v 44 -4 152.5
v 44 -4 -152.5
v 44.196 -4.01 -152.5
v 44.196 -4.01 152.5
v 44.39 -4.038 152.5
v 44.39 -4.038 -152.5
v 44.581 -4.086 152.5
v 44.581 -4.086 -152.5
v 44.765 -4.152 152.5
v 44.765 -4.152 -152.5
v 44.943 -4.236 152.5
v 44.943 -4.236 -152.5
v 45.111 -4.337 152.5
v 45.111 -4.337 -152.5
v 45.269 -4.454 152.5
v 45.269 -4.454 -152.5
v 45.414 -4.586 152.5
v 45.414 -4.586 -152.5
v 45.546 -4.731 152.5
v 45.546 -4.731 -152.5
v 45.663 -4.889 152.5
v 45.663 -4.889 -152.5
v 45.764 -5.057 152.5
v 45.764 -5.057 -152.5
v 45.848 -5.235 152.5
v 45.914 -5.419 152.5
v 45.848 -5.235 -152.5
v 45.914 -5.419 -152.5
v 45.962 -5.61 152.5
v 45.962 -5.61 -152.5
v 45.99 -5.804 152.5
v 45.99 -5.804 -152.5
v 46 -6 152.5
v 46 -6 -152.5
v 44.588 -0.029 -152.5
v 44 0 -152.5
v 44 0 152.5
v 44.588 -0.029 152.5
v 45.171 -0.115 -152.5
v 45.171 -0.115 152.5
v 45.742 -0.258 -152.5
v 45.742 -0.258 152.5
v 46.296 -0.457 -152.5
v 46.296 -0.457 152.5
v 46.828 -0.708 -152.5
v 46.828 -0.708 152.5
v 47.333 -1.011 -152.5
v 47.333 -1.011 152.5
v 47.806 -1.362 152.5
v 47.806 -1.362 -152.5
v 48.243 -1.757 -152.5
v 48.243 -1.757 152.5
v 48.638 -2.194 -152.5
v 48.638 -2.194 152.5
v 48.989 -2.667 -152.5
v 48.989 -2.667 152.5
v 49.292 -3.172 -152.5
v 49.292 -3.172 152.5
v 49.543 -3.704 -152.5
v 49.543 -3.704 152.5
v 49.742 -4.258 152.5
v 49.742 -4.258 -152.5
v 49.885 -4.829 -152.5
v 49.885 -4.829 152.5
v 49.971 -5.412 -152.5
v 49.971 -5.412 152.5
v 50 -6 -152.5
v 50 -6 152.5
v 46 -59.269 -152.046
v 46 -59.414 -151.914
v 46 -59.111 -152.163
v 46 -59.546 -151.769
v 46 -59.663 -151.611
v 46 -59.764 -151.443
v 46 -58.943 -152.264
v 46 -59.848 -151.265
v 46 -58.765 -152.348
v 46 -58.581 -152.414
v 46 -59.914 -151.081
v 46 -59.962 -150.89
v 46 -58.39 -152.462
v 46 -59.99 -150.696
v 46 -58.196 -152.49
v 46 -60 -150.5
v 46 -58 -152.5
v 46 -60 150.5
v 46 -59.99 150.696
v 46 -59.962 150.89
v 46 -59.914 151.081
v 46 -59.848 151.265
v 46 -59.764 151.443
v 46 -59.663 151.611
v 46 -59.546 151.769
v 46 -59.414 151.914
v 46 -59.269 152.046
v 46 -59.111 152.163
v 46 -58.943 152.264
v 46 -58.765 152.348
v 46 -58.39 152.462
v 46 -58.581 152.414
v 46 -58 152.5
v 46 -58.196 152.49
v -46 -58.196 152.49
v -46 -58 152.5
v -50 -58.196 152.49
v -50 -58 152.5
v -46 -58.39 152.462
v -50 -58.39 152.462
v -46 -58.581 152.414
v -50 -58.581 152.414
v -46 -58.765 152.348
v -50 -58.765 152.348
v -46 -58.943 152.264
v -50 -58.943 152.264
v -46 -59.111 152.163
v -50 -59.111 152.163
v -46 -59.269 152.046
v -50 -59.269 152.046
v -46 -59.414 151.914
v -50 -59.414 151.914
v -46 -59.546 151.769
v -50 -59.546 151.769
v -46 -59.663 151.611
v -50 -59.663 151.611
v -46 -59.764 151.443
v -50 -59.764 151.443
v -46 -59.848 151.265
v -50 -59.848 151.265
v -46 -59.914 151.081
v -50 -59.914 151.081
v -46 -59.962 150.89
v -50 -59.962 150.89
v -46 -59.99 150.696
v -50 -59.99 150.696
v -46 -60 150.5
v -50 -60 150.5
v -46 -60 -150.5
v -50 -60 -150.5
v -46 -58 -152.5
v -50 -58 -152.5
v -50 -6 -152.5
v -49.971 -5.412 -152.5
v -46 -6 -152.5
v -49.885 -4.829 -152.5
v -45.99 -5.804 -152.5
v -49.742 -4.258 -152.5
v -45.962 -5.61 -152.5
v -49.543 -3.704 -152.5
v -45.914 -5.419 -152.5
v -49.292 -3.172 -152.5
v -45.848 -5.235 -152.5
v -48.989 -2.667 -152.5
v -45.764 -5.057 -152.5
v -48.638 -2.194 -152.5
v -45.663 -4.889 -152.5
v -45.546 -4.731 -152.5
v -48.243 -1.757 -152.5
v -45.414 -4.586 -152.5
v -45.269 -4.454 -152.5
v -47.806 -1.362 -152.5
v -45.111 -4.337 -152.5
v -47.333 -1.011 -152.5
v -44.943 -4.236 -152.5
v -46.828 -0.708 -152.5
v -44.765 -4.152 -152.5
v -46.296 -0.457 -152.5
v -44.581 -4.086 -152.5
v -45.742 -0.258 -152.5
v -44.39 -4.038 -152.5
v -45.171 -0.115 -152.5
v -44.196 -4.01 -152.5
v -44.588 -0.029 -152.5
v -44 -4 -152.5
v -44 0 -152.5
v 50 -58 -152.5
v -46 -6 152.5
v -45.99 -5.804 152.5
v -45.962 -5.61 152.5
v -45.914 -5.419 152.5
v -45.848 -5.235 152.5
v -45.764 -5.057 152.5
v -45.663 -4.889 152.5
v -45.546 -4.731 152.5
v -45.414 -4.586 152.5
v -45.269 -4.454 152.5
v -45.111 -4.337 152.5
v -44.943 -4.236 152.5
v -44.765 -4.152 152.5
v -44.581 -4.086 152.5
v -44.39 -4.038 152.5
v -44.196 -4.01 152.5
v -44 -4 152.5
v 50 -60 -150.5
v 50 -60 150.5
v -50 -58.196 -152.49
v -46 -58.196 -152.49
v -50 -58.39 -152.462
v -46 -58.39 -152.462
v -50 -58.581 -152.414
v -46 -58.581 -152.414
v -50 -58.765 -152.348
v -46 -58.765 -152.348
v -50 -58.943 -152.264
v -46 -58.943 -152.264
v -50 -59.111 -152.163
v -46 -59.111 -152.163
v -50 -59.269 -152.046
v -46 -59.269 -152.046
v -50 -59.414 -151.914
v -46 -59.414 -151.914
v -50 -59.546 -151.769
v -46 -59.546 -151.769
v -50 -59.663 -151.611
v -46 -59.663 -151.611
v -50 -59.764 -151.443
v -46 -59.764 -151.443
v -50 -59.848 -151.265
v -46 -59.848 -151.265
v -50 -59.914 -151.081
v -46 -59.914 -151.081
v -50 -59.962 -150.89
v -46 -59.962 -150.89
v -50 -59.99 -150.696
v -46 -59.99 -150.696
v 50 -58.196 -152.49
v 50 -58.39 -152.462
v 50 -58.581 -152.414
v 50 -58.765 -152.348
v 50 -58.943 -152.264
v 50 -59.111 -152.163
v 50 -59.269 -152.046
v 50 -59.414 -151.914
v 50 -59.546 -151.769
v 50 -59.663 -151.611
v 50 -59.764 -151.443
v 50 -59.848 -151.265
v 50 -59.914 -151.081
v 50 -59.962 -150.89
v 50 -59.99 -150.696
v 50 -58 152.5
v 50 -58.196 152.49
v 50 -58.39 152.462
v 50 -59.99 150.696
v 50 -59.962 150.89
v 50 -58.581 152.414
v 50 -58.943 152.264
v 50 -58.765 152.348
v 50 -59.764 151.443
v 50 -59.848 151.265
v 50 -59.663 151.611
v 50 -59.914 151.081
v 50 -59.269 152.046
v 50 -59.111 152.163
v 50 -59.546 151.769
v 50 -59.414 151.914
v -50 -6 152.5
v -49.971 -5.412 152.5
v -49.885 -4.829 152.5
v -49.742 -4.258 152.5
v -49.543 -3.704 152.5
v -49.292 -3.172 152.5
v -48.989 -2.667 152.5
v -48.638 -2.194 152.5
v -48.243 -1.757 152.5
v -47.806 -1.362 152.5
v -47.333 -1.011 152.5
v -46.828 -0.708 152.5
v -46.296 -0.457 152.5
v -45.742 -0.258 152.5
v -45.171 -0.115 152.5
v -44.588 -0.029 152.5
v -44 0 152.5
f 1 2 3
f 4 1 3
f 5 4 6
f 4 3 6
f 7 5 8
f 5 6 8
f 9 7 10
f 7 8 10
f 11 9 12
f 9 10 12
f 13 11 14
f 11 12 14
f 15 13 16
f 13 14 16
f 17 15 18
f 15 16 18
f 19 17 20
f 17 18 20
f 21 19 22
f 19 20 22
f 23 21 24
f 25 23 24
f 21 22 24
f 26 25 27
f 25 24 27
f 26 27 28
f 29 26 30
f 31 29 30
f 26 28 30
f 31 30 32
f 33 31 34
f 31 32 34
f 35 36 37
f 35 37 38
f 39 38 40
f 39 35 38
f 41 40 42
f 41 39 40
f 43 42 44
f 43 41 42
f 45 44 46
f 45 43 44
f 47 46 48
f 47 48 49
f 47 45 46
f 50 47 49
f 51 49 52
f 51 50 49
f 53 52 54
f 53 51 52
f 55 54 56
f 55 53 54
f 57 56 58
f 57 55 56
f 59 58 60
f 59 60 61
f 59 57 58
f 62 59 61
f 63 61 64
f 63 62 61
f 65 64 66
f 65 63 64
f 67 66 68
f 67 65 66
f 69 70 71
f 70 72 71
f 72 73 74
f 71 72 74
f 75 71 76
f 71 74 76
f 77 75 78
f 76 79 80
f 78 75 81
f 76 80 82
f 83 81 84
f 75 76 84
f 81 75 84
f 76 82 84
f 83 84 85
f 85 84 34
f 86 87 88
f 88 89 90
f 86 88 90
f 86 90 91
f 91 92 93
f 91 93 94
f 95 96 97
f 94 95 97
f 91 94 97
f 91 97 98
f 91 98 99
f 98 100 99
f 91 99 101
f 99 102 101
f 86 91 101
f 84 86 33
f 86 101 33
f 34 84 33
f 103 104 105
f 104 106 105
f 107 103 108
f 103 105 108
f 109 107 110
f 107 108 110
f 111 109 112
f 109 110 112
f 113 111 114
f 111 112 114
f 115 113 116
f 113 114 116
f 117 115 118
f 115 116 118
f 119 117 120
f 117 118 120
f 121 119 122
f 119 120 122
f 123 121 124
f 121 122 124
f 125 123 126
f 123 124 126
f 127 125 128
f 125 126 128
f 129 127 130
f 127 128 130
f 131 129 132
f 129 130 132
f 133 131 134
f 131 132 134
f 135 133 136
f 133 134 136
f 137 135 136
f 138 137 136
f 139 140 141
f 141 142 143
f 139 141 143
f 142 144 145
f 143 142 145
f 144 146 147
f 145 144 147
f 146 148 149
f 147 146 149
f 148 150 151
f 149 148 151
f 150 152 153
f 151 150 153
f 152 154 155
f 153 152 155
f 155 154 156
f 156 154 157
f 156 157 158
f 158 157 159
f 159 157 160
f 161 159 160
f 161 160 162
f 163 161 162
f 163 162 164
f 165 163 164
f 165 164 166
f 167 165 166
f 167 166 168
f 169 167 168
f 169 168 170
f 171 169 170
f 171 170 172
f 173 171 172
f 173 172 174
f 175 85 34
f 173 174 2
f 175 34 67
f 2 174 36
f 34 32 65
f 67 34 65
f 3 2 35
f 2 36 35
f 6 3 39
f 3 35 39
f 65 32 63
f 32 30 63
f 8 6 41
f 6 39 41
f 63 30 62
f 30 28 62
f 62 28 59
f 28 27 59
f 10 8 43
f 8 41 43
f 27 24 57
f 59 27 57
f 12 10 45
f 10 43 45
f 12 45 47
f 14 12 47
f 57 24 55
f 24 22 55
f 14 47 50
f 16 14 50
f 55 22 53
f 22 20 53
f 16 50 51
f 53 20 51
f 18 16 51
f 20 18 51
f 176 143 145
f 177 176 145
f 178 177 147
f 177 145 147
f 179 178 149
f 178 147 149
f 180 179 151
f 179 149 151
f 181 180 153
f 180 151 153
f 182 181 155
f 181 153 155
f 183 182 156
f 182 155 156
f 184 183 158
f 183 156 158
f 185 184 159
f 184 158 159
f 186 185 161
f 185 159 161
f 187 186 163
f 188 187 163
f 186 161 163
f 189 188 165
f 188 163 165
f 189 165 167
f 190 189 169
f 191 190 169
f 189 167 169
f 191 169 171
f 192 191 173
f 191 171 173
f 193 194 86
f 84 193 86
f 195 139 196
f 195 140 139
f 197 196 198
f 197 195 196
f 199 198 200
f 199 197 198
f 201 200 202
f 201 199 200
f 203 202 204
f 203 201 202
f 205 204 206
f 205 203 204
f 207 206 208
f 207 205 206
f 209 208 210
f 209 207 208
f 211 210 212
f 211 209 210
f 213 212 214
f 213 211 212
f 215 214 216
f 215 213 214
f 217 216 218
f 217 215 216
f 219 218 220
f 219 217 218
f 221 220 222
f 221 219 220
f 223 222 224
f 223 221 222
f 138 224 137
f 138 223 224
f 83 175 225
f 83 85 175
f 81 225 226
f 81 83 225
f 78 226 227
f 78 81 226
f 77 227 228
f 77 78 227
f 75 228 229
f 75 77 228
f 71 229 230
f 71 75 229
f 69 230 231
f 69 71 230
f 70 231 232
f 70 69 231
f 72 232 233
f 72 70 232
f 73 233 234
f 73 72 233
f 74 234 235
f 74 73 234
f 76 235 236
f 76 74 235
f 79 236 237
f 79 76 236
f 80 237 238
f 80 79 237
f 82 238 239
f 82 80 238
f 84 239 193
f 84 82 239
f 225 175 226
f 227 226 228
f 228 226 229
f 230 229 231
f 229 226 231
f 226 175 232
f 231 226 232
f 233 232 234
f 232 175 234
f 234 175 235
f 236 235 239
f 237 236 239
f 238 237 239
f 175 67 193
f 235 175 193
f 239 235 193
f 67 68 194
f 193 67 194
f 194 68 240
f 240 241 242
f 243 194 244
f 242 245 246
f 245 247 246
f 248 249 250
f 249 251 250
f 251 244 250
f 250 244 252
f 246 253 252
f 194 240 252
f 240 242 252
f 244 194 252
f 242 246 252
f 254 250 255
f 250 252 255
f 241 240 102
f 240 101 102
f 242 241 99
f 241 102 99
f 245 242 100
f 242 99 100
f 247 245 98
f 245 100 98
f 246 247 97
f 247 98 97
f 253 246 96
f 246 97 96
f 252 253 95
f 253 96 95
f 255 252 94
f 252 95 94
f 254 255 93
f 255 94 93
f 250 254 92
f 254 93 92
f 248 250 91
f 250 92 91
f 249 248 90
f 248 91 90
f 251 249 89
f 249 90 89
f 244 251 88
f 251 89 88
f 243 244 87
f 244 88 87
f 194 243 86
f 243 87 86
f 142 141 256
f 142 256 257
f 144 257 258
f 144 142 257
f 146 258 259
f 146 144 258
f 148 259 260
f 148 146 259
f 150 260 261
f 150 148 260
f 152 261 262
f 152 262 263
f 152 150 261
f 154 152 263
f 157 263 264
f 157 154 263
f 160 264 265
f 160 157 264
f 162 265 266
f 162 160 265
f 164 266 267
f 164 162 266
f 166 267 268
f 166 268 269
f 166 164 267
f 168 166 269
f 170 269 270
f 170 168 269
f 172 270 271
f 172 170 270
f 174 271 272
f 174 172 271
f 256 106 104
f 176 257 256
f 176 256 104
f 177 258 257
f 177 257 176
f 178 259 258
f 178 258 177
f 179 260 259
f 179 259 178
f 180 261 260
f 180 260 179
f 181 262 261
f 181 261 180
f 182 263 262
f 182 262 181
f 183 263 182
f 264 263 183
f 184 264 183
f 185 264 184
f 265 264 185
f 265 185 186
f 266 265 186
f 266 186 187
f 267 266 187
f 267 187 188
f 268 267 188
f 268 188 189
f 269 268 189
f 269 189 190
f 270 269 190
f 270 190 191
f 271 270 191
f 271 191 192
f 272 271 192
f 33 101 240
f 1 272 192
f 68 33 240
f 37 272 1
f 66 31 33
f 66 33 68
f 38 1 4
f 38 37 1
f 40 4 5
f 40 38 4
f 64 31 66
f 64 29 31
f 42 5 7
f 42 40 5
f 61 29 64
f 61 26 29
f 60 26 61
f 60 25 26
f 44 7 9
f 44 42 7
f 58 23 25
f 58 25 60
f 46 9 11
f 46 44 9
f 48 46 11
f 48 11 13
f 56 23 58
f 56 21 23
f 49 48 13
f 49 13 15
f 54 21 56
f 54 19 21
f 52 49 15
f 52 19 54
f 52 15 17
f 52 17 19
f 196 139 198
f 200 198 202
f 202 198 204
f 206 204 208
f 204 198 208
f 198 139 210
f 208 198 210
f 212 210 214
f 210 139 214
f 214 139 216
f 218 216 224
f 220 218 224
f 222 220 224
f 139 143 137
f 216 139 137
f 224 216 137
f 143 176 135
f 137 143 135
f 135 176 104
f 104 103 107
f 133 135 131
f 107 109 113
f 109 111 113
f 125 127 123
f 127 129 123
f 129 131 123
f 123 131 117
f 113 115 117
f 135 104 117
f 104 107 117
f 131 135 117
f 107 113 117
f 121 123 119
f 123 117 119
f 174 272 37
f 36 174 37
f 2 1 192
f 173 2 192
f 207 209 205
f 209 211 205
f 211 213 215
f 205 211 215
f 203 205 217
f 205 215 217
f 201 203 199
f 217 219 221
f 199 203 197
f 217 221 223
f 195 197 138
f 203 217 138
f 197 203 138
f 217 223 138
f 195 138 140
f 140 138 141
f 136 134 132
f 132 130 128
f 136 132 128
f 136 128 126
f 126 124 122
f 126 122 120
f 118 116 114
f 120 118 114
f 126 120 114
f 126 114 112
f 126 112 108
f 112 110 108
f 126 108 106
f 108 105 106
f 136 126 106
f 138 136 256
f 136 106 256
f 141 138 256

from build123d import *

# Parameters (mm, degrees)
EXTRUDE_THIN1_DEPTH    = 152.5
CONVERT_SOLID1_START   = -152.5
CONVERT_SOLID1_DEPTH   = 305
CONVERT_SOLID1_2_DEPTH = 305
FILLET1_R              = 2


# Read off the part's stored shape, not the designer's step: Convert-Solid1
with BuildPart() as part:
    # Sketch1 → Extrude-Thin1 (new, symmetric)
    with BuildSketch(Plane.XY):
        Polygon((-50, -60), (-50, 0), (50, 0), (50, -60), (46, -60), (46, -4), (-46, -4), (-46, -60), align=None)
    extrude(amount=EXTRUDE_THIN1_DEPTH, both=True)

    # Convert-Solid1 outline → Convert-Solid1 (cut)
    with BuildSketch(Plane.XY.offset(CONVERT_SOLID1_START)):
        with BuildLine():
            Line((50, 0), (44, 0))
            ThreePointArc((44, 0), (48.242640687, -1.757359313), (50, -6))
            Line((50, -6), (50, 0))
        make_face()
        with BuildLine():
            ThreePointArc((-50, -6), (-48.242640687, -1.757359313), (-44, 0))
            Line((-44, 0), (-50, 0))
            Line((-50, 0), (-50, -6))
        make_face()
    extrude(amount=CONVERT_SOLID1_DEPTH, mode=Mode.SUBTRACT)

    # Convert-Solid1 2 outline → Convert-Solid1 2 (add)
    with BuildSketch(Plane.XY.offset(CONVERT_SOLID1_START)):
        with BuildLine():
            Line((46, -4), (44, -4))
            ThreePointArc((44, -4), (45.414213562, -4.585786438), (46, -6))
            Line((46, -6), (46, -4))
        make_face()
        with BuildLine():
            ThreePointArc((-46, -6), (-45.414213562, -4.585786438), (-44, -4))
            Line((-44, -4), (-46, -4))
            Line((-46, -4), (-46, -6))
        make_face()
    extrude(amount=CONVERT_SOLID1_2_DEPTH)

    # Fillet1
    fillet1_edges = [part.edges().sort_by_distance(p)[0] for p in [
        (48, -60, 152.5),
        (48, -60, -152.5),
        (-48, -60, -152.5),
        (-48, -60, 152.5),
    ]]
    fillet(fillet1_edges, radius=FILLET1_R)


solid = part.part
